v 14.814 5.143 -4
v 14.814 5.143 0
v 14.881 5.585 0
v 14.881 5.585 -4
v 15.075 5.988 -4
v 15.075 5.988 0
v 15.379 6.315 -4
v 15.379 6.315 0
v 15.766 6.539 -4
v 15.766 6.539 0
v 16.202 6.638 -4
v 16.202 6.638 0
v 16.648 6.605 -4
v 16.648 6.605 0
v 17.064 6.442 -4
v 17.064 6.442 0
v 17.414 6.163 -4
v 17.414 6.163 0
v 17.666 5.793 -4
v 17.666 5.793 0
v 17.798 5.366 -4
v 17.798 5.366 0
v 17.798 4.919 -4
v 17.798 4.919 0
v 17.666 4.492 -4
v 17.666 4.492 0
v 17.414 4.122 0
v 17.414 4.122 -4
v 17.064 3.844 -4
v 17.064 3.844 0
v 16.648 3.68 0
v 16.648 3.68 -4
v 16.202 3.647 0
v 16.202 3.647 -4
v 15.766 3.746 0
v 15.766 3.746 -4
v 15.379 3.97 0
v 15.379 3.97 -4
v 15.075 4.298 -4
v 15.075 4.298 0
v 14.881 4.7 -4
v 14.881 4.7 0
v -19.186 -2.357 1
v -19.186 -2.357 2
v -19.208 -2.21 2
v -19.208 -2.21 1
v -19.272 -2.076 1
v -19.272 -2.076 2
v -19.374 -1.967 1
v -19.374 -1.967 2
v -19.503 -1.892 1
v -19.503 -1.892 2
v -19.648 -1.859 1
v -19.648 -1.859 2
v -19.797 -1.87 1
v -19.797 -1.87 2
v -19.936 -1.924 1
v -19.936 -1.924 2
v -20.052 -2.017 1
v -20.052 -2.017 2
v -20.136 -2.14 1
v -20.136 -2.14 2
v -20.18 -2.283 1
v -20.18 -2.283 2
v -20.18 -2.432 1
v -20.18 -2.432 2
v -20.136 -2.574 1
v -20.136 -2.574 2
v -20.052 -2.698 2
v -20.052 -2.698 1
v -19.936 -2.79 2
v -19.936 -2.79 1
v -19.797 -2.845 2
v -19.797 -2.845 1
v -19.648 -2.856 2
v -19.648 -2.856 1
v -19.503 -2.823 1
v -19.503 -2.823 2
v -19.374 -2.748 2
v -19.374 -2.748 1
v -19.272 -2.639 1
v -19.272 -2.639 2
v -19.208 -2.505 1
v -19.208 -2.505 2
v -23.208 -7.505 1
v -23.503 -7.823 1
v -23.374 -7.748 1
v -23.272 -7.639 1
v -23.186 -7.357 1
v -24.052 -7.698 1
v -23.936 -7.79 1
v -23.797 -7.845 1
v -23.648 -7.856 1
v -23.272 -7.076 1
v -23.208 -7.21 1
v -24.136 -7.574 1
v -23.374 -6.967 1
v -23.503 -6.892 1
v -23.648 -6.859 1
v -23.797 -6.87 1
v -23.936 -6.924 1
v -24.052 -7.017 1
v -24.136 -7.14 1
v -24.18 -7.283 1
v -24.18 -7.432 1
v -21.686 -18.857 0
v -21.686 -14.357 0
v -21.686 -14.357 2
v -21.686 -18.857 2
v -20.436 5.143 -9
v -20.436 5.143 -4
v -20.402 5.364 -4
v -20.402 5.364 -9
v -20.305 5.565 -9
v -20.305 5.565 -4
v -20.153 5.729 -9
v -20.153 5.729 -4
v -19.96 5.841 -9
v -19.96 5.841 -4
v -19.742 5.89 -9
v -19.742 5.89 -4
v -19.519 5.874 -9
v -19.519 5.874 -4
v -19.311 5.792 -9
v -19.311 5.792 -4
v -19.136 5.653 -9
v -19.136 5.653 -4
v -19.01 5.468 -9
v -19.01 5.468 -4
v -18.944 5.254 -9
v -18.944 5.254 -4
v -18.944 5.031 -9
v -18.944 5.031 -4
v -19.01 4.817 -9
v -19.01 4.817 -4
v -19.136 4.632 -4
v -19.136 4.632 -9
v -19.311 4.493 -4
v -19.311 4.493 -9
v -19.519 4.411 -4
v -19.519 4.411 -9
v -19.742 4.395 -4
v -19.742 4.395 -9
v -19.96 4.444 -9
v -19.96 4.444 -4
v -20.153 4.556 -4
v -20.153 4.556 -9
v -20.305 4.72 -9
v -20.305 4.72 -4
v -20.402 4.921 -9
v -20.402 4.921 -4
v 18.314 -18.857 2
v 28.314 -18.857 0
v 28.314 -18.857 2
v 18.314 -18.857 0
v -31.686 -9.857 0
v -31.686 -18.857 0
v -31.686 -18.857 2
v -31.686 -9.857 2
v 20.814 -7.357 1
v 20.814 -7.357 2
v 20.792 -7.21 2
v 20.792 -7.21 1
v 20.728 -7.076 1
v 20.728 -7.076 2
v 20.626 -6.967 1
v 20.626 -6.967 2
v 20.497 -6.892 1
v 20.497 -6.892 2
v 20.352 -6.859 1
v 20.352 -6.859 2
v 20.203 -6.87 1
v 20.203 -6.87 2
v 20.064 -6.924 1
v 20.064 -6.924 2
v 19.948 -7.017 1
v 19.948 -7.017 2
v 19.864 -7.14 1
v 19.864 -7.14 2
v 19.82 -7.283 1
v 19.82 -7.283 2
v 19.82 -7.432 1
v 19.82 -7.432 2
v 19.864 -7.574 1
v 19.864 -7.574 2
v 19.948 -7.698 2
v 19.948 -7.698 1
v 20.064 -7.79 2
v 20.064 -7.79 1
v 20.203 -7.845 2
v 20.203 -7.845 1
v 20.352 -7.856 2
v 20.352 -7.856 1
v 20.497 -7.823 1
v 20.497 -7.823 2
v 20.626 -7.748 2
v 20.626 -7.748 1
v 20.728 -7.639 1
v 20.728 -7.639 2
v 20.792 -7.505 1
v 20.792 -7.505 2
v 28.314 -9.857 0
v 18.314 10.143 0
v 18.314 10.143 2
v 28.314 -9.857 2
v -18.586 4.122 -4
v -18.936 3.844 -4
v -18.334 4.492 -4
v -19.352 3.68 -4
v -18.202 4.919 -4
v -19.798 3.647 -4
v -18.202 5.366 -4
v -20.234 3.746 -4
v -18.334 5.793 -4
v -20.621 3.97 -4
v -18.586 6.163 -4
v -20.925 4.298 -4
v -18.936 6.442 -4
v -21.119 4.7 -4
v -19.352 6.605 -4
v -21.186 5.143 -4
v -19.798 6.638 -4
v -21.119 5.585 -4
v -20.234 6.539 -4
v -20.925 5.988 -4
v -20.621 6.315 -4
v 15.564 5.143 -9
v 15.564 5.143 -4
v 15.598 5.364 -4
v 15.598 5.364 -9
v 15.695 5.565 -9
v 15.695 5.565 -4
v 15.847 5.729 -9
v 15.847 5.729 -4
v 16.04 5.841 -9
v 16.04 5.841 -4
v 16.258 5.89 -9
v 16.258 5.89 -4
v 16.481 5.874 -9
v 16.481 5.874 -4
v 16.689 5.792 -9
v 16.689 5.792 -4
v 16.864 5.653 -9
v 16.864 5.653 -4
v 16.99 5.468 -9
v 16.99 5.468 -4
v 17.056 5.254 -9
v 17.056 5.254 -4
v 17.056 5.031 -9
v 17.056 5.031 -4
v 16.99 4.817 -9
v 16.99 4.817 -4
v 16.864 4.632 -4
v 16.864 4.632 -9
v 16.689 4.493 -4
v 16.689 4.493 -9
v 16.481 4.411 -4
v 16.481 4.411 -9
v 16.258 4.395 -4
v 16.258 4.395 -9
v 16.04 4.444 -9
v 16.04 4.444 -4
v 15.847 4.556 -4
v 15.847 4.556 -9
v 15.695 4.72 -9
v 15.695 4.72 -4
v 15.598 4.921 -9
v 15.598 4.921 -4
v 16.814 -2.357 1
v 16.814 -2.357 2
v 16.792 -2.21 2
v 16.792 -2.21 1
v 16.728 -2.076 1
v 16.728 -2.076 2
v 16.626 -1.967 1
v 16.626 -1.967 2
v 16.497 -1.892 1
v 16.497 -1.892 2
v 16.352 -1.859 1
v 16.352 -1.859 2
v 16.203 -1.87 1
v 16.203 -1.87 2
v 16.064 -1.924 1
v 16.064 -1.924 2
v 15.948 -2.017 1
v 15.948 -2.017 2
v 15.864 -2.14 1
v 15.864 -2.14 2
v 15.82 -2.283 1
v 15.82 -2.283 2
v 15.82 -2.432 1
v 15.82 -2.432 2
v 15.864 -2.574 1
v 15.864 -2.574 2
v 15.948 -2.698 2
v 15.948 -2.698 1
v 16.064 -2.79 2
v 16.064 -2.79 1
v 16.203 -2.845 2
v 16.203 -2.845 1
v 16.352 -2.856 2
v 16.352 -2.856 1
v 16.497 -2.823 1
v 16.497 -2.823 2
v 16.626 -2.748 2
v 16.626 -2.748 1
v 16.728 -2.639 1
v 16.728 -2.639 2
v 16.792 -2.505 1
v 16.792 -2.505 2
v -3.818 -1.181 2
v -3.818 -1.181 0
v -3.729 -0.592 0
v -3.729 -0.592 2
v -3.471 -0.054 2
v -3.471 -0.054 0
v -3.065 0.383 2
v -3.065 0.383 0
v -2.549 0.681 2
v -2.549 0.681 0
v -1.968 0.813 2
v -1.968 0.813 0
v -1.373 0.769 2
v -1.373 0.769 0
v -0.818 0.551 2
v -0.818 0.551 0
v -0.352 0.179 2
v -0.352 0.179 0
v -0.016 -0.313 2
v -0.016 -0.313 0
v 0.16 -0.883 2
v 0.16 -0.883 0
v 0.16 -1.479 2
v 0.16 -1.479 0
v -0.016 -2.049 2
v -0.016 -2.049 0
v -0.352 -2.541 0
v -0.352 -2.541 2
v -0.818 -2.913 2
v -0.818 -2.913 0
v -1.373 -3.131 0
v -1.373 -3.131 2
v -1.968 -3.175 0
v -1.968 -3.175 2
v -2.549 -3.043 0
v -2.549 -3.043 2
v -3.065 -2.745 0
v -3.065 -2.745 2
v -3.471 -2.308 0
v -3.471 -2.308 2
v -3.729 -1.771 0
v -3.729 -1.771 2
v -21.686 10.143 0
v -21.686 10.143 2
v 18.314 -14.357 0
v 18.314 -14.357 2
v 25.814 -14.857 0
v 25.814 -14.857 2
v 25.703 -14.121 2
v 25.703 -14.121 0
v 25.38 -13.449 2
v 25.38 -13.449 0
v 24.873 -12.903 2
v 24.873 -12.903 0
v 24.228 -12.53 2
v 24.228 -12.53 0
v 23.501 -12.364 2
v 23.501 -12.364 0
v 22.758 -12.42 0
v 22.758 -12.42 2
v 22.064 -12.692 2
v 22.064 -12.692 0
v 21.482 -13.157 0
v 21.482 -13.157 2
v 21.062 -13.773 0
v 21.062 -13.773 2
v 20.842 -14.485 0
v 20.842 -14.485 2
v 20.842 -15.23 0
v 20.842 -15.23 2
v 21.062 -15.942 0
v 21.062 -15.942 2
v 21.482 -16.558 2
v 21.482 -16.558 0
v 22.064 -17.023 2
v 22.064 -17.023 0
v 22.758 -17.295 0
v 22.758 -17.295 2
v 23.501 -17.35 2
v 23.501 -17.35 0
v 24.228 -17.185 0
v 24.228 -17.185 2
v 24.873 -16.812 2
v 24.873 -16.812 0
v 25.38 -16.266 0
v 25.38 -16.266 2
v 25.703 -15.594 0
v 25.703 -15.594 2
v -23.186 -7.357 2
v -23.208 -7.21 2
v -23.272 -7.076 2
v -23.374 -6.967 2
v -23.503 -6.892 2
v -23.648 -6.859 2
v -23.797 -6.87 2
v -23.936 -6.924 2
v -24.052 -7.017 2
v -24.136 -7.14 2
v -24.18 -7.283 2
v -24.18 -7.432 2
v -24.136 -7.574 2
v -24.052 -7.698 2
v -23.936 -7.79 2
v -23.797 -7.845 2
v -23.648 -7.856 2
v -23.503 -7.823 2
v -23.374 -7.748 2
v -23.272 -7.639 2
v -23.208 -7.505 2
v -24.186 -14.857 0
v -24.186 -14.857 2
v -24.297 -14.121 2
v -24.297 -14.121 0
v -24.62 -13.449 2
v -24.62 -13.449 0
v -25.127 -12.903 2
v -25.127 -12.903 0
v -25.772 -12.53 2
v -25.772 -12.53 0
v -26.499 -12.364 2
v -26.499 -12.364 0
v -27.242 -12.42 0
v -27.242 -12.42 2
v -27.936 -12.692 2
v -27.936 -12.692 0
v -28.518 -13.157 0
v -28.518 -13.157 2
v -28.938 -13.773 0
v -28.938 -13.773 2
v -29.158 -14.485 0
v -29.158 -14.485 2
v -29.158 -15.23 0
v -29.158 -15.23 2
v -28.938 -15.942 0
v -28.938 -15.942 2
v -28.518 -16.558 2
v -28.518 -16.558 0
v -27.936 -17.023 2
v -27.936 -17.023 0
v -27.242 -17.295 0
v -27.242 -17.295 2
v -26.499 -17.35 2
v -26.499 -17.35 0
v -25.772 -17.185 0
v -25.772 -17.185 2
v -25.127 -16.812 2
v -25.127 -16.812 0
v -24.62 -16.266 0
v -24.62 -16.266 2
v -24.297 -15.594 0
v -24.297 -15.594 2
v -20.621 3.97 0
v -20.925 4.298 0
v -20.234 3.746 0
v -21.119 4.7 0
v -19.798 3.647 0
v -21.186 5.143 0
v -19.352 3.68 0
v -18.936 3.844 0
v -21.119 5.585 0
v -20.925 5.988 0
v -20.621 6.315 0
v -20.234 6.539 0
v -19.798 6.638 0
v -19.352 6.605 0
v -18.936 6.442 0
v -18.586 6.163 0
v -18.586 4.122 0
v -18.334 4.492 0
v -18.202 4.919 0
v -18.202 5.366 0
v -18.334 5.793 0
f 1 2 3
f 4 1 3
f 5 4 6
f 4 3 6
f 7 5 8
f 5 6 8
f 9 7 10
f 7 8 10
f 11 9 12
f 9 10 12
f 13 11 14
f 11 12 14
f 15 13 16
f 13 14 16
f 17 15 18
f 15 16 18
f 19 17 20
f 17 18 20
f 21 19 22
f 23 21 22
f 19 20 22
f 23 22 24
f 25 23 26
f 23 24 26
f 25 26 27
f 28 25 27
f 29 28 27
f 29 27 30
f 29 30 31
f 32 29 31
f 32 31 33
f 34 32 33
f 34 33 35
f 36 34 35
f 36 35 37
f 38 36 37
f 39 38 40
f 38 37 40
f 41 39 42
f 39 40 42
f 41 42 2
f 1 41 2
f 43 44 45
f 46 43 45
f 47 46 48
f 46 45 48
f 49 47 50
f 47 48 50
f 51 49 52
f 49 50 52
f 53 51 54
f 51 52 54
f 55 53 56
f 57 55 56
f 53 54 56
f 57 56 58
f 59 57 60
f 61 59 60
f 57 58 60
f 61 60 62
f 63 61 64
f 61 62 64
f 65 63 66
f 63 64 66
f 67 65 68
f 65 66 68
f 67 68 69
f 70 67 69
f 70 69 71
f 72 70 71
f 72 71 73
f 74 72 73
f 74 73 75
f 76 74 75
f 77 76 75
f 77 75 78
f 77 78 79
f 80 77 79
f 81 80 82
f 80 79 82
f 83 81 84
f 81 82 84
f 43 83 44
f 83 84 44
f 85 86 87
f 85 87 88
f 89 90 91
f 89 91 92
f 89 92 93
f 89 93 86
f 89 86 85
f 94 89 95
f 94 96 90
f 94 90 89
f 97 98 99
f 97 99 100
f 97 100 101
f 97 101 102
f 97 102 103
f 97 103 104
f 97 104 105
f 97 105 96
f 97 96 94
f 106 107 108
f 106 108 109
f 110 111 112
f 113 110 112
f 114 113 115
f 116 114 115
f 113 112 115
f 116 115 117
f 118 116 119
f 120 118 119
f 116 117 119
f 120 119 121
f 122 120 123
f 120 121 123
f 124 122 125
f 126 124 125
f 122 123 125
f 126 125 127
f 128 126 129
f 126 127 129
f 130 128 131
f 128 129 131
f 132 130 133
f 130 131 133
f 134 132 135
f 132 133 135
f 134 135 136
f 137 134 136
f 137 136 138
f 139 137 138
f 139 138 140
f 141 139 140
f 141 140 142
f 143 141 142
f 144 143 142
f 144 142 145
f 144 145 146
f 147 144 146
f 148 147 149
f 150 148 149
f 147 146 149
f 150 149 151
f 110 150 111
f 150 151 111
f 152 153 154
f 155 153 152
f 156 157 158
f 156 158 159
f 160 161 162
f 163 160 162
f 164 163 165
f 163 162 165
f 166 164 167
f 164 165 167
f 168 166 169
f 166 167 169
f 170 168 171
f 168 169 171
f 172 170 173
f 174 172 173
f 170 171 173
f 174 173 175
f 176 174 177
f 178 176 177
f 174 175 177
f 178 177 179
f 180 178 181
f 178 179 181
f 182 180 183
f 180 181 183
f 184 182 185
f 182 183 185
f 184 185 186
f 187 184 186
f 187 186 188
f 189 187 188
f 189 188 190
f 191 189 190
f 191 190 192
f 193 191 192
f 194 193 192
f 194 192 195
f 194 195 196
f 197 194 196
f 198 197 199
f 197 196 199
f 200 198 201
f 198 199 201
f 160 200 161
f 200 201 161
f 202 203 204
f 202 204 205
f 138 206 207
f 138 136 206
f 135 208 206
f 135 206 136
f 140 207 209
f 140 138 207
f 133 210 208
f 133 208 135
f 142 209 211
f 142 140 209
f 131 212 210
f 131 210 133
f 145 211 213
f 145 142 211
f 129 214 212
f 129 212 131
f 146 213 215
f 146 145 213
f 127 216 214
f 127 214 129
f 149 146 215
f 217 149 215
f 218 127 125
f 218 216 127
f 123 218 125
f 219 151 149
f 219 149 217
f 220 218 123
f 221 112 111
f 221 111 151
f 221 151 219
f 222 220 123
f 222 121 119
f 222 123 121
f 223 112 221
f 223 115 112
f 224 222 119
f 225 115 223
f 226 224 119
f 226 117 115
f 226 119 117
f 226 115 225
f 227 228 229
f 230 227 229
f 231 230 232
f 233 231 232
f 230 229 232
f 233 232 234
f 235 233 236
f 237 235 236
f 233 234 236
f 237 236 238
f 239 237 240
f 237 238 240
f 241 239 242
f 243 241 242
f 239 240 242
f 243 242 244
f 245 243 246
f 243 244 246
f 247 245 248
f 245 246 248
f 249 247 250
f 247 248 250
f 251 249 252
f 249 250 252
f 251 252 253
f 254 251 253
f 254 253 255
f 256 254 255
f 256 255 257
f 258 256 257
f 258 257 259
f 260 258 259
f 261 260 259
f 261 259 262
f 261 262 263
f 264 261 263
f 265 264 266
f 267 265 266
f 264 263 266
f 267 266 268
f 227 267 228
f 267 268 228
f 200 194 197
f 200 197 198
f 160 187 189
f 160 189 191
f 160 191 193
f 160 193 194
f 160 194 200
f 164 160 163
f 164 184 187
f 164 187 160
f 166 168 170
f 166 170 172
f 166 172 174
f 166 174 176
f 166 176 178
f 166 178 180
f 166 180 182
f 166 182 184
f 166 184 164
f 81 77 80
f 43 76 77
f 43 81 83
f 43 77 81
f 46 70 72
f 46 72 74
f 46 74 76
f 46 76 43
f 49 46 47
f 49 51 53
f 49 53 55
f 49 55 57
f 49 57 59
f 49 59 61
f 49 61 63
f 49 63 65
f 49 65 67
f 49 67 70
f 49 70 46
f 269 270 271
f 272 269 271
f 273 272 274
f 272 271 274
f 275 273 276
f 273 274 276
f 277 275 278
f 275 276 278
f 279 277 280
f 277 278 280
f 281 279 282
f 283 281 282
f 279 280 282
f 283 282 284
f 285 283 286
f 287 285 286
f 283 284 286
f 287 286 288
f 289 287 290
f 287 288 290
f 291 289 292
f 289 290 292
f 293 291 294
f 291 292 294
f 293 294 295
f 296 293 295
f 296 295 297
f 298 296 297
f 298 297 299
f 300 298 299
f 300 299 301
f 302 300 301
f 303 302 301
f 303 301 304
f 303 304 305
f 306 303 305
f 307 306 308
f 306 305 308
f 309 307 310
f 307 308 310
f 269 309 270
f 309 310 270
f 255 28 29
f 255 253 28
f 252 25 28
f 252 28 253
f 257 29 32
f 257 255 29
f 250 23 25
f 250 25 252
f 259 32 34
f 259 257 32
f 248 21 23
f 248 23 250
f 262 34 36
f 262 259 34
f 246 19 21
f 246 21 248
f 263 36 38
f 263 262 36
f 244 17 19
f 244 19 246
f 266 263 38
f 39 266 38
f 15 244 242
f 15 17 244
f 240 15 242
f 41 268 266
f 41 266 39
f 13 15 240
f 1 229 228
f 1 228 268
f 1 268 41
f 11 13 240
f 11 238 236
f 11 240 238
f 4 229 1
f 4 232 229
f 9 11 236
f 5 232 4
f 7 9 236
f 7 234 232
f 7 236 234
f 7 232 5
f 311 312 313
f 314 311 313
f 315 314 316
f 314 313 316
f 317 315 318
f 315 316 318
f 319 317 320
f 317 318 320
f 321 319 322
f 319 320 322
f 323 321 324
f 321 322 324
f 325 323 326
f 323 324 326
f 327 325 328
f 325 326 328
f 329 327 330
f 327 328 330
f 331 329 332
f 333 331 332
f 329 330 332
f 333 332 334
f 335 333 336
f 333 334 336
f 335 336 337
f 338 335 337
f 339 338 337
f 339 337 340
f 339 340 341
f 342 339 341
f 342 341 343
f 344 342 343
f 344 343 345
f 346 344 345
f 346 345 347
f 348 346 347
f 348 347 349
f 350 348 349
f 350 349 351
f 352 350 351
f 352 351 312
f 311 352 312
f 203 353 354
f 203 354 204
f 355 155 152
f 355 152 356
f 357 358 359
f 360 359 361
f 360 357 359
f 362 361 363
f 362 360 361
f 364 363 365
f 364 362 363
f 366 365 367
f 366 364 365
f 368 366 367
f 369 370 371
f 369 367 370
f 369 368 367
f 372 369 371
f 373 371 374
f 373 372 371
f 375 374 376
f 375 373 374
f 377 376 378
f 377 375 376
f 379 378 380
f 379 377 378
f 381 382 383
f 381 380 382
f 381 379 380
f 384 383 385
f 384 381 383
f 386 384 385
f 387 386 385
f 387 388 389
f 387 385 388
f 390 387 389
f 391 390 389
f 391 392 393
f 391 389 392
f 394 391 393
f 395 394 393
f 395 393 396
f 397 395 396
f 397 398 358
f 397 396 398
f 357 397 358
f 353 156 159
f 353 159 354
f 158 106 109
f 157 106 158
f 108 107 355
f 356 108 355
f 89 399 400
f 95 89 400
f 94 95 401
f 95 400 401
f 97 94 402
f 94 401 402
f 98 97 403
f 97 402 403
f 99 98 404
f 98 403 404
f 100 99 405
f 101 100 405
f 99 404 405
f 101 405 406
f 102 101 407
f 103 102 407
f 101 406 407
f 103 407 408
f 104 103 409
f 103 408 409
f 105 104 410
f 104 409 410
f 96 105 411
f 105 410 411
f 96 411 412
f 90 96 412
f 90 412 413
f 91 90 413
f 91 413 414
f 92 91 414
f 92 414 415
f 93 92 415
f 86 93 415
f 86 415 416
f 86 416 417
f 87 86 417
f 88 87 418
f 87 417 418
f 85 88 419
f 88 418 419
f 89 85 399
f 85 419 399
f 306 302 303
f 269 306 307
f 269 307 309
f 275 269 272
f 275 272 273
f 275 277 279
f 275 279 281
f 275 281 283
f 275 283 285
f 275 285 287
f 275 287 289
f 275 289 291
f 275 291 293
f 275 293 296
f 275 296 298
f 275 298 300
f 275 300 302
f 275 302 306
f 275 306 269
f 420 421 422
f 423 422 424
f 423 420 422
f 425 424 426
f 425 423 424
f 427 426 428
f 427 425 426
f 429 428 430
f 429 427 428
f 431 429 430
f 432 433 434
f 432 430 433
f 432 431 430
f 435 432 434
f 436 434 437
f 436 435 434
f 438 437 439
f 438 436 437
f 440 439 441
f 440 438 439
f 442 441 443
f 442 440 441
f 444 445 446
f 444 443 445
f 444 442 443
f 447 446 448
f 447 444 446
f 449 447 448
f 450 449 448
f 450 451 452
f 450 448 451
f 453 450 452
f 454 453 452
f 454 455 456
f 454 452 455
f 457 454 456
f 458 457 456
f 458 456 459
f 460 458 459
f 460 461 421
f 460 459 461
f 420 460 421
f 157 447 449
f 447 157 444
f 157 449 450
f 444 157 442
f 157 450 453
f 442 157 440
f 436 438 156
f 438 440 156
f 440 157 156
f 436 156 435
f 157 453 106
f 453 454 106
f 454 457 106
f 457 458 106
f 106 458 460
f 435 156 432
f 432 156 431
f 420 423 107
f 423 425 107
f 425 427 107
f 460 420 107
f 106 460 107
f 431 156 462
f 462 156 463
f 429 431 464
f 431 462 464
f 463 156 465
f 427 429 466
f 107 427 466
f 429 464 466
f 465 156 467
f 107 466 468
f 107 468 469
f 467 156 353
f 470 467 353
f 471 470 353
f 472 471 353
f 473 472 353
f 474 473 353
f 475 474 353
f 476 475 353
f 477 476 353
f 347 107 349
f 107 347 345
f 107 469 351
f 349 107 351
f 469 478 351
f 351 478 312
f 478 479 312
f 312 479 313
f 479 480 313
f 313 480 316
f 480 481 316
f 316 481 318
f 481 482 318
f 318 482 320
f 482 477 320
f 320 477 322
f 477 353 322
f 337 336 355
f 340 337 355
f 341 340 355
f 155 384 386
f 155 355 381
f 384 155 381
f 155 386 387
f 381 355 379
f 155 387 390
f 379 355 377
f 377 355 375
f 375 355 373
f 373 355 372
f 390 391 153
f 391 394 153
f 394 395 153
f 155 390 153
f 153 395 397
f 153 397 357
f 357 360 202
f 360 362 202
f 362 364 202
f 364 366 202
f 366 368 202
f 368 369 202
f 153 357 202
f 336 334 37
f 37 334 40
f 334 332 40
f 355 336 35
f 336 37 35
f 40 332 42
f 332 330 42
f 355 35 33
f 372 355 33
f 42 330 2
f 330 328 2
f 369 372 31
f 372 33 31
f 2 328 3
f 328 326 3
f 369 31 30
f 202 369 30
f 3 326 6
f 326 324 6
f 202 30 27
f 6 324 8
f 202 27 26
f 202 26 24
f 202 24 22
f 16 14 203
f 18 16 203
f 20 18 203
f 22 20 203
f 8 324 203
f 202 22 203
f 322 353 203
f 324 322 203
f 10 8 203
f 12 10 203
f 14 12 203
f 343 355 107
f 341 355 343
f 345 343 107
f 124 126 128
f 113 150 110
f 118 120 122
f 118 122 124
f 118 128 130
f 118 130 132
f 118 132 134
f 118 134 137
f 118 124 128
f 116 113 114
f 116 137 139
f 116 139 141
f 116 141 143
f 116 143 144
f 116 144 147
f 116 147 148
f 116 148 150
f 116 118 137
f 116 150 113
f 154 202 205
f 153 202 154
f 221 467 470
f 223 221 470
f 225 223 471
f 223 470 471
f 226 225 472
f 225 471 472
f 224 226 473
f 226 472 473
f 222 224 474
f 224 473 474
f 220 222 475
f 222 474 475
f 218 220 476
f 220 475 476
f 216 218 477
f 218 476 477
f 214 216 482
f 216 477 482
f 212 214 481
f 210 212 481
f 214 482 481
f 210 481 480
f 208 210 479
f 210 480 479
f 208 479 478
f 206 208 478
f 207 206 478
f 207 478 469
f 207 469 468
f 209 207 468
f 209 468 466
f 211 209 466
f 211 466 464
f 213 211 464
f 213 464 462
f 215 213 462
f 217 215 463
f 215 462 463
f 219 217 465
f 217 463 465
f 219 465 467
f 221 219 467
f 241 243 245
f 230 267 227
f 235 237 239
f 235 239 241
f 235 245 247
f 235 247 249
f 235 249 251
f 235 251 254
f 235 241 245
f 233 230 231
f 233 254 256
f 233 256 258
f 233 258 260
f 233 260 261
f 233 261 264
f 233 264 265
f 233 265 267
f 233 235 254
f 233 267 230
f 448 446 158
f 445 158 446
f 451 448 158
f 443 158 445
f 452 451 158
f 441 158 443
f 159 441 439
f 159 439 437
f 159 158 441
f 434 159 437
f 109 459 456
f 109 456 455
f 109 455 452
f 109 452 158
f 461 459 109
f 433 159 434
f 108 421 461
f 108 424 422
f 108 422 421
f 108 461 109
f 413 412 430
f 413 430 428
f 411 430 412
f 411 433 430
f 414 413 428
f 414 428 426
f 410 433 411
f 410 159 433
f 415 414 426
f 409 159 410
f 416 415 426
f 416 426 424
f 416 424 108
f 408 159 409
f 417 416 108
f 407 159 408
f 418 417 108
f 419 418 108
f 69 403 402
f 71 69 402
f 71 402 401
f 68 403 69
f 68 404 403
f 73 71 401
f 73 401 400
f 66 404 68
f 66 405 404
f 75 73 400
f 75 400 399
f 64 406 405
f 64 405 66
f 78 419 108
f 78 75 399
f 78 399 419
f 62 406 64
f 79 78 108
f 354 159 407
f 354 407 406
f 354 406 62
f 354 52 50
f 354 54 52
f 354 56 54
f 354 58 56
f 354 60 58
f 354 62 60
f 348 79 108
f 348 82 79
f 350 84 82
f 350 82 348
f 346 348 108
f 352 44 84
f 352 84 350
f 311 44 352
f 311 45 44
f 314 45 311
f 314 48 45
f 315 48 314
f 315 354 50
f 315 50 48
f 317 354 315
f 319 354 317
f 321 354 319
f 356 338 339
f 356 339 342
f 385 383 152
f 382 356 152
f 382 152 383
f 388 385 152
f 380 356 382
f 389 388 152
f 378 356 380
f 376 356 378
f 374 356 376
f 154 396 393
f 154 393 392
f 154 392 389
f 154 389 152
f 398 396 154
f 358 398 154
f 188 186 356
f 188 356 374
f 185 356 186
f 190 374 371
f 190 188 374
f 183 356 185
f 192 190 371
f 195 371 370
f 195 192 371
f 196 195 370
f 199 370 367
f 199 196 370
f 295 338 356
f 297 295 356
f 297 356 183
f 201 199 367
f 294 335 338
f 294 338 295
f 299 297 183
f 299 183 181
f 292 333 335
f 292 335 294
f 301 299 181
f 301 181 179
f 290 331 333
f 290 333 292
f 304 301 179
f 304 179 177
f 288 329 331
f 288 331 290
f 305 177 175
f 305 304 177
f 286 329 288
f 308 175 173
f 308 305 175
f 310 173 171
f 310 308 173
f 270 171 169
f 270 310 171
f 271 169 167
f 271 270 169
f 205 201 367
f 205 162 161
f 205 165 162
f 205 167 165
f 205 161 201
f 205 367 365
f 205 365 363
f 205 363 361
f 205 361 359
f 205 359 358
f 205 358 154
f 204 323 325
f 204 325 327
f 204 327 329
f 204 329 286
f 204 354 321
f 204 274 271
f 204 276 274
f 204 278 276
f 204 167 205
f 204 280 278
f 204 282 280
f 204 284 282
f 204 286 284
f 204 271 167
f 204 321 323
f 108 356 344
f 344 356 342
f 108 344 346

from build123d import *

# Parameters (mm, degrees)
EXTRUDE_1_DEPTH     = 2
SKETCH_2_R          = 2.5
CUT_EXTRUDE_3_DEPTH = 3
SKETCH_3_R          = 1.5
EXTRUDE_2_DEPTH     = 4
SKETCH_4_R          = 0.75
EXTRUDE_3_DEPTH     = 5
SKETCH_5_W          = 40
SKETCH_5_H          = 4.5
EXTRUDE_4_DEPTH     = 2
SKETCH_6_R          = 0.5
CUT_EXTRUDE_4_DEPTH = 1
SKETCH_7_R          = 2
CUT_EXTRUDE_5_DEPTH = 3


with BuildPart() as part:
    # 草图1 → 凸台-拉伸1 (new body)
    with BuildSketch(Plane.XY):
        Polygon((-21.685600323, 10.142561447), (18.314399677, 10.142561447), (28.314399677, -9.857438553), (28.314399677, -18.857438553), (18.314399677, -18.857438553), (18.314399677, -9.857438553), (-21.685600323, -9.857438553), (-21.685600323, -18.857438553), (-31.685600323, -18.857438553), (-31.685600323, -9.857438553), align=None)
    extrude(amount=EXTRUDE_1_DEPTH)

    # 草图2 → 切除-拉伸3 (cut, through all)
    with BuildSketch(Plane.XY):
        with Locations((-26.685600323, -14.857438553)):
            Circle(SKETCH_2_R)
        with Locations((23.314399677, -14.857438553)):
            Circle(SKETCH_2_R)
    extrude(amount=CUT_EXTRUDE_3_DEPTH, mode=Mode.SUBTRACT)

    # 草图3 → 凸台-拉伸2 (add)
    with BuildSketch(Plane(origin=(0, 0, 0), x_dir=(-1, 0, 0), z_dir=(0, 0, -1))):
        with Locations((-16.314399677, 5.142561447)):
            Circle(SKETCH_3_R)
        with Locations((19.685600323, 5.142561447)):
            Circle(SKETCH_3_R)
    extrude(amount=EXTRUDE_2_DEPTH)

    # 草图4 → 凸台-拉伸3 (add)
    with BuildSketch(Plane(origin=(0, 0, -4), x_dir=(-1, 0, 0), z_dir=(0, 0, -1))):
        with Locations((-16.314399677, 5.142561447)):
            Circle(SKETCH_4_R)
        with Locations((19.685600323, 5.142561447)):
            Circle(SKETCH_4_R)
    extrude(amount=EXTRUDE_3_DEPTH)

    # 草图5 → 凸台-拉伸4 (add)
    with BuildSketch(Plane.XY):
        with Locations((-1.685600323, -12.107438553)):
            Rectangle(SKETCH_5_W, SKETCH_5_H)
    extrude(amount=EXTRUDE_4_DEPTH)

    # 草图6 → 切除-拉伸4 (cut)
    with BuildSketch(Plane.XY.offset(2)):
        with Locations((-23.685600323, -7.357438553)):
            Circle(SKETCH_6_R)
        with Locations((20.314399677, -7.357438553)):
            Circle(SKETCH_6_R)
        with Locations((-19.685600323, -2.357438553)):
            Circle(SKETCH_6_R)
        with Locations((16.314399677, -2.357438553)):
            Circle(SKETCH_6_R)
    extrude(amount=-CUT_EXTRUDE_4_DEPTH, mode=Mode.SUBTRACT)

    # 草图7 → 切除-拉伸5 (cut, through all)
    with BuildSketch(Plane(origin=(0, 0, 0), x_dir=(-1, 0, 0), z_dir=(0, 0, -1))):
        with Locations((1.818081587, -1.181083472)):
            Circle(SKETCH_7_R)
    extrude(amount=-CUT_EXTRUDE_5_DEPTH, mode=Mode.SUBTRACT)


solid = part.part
